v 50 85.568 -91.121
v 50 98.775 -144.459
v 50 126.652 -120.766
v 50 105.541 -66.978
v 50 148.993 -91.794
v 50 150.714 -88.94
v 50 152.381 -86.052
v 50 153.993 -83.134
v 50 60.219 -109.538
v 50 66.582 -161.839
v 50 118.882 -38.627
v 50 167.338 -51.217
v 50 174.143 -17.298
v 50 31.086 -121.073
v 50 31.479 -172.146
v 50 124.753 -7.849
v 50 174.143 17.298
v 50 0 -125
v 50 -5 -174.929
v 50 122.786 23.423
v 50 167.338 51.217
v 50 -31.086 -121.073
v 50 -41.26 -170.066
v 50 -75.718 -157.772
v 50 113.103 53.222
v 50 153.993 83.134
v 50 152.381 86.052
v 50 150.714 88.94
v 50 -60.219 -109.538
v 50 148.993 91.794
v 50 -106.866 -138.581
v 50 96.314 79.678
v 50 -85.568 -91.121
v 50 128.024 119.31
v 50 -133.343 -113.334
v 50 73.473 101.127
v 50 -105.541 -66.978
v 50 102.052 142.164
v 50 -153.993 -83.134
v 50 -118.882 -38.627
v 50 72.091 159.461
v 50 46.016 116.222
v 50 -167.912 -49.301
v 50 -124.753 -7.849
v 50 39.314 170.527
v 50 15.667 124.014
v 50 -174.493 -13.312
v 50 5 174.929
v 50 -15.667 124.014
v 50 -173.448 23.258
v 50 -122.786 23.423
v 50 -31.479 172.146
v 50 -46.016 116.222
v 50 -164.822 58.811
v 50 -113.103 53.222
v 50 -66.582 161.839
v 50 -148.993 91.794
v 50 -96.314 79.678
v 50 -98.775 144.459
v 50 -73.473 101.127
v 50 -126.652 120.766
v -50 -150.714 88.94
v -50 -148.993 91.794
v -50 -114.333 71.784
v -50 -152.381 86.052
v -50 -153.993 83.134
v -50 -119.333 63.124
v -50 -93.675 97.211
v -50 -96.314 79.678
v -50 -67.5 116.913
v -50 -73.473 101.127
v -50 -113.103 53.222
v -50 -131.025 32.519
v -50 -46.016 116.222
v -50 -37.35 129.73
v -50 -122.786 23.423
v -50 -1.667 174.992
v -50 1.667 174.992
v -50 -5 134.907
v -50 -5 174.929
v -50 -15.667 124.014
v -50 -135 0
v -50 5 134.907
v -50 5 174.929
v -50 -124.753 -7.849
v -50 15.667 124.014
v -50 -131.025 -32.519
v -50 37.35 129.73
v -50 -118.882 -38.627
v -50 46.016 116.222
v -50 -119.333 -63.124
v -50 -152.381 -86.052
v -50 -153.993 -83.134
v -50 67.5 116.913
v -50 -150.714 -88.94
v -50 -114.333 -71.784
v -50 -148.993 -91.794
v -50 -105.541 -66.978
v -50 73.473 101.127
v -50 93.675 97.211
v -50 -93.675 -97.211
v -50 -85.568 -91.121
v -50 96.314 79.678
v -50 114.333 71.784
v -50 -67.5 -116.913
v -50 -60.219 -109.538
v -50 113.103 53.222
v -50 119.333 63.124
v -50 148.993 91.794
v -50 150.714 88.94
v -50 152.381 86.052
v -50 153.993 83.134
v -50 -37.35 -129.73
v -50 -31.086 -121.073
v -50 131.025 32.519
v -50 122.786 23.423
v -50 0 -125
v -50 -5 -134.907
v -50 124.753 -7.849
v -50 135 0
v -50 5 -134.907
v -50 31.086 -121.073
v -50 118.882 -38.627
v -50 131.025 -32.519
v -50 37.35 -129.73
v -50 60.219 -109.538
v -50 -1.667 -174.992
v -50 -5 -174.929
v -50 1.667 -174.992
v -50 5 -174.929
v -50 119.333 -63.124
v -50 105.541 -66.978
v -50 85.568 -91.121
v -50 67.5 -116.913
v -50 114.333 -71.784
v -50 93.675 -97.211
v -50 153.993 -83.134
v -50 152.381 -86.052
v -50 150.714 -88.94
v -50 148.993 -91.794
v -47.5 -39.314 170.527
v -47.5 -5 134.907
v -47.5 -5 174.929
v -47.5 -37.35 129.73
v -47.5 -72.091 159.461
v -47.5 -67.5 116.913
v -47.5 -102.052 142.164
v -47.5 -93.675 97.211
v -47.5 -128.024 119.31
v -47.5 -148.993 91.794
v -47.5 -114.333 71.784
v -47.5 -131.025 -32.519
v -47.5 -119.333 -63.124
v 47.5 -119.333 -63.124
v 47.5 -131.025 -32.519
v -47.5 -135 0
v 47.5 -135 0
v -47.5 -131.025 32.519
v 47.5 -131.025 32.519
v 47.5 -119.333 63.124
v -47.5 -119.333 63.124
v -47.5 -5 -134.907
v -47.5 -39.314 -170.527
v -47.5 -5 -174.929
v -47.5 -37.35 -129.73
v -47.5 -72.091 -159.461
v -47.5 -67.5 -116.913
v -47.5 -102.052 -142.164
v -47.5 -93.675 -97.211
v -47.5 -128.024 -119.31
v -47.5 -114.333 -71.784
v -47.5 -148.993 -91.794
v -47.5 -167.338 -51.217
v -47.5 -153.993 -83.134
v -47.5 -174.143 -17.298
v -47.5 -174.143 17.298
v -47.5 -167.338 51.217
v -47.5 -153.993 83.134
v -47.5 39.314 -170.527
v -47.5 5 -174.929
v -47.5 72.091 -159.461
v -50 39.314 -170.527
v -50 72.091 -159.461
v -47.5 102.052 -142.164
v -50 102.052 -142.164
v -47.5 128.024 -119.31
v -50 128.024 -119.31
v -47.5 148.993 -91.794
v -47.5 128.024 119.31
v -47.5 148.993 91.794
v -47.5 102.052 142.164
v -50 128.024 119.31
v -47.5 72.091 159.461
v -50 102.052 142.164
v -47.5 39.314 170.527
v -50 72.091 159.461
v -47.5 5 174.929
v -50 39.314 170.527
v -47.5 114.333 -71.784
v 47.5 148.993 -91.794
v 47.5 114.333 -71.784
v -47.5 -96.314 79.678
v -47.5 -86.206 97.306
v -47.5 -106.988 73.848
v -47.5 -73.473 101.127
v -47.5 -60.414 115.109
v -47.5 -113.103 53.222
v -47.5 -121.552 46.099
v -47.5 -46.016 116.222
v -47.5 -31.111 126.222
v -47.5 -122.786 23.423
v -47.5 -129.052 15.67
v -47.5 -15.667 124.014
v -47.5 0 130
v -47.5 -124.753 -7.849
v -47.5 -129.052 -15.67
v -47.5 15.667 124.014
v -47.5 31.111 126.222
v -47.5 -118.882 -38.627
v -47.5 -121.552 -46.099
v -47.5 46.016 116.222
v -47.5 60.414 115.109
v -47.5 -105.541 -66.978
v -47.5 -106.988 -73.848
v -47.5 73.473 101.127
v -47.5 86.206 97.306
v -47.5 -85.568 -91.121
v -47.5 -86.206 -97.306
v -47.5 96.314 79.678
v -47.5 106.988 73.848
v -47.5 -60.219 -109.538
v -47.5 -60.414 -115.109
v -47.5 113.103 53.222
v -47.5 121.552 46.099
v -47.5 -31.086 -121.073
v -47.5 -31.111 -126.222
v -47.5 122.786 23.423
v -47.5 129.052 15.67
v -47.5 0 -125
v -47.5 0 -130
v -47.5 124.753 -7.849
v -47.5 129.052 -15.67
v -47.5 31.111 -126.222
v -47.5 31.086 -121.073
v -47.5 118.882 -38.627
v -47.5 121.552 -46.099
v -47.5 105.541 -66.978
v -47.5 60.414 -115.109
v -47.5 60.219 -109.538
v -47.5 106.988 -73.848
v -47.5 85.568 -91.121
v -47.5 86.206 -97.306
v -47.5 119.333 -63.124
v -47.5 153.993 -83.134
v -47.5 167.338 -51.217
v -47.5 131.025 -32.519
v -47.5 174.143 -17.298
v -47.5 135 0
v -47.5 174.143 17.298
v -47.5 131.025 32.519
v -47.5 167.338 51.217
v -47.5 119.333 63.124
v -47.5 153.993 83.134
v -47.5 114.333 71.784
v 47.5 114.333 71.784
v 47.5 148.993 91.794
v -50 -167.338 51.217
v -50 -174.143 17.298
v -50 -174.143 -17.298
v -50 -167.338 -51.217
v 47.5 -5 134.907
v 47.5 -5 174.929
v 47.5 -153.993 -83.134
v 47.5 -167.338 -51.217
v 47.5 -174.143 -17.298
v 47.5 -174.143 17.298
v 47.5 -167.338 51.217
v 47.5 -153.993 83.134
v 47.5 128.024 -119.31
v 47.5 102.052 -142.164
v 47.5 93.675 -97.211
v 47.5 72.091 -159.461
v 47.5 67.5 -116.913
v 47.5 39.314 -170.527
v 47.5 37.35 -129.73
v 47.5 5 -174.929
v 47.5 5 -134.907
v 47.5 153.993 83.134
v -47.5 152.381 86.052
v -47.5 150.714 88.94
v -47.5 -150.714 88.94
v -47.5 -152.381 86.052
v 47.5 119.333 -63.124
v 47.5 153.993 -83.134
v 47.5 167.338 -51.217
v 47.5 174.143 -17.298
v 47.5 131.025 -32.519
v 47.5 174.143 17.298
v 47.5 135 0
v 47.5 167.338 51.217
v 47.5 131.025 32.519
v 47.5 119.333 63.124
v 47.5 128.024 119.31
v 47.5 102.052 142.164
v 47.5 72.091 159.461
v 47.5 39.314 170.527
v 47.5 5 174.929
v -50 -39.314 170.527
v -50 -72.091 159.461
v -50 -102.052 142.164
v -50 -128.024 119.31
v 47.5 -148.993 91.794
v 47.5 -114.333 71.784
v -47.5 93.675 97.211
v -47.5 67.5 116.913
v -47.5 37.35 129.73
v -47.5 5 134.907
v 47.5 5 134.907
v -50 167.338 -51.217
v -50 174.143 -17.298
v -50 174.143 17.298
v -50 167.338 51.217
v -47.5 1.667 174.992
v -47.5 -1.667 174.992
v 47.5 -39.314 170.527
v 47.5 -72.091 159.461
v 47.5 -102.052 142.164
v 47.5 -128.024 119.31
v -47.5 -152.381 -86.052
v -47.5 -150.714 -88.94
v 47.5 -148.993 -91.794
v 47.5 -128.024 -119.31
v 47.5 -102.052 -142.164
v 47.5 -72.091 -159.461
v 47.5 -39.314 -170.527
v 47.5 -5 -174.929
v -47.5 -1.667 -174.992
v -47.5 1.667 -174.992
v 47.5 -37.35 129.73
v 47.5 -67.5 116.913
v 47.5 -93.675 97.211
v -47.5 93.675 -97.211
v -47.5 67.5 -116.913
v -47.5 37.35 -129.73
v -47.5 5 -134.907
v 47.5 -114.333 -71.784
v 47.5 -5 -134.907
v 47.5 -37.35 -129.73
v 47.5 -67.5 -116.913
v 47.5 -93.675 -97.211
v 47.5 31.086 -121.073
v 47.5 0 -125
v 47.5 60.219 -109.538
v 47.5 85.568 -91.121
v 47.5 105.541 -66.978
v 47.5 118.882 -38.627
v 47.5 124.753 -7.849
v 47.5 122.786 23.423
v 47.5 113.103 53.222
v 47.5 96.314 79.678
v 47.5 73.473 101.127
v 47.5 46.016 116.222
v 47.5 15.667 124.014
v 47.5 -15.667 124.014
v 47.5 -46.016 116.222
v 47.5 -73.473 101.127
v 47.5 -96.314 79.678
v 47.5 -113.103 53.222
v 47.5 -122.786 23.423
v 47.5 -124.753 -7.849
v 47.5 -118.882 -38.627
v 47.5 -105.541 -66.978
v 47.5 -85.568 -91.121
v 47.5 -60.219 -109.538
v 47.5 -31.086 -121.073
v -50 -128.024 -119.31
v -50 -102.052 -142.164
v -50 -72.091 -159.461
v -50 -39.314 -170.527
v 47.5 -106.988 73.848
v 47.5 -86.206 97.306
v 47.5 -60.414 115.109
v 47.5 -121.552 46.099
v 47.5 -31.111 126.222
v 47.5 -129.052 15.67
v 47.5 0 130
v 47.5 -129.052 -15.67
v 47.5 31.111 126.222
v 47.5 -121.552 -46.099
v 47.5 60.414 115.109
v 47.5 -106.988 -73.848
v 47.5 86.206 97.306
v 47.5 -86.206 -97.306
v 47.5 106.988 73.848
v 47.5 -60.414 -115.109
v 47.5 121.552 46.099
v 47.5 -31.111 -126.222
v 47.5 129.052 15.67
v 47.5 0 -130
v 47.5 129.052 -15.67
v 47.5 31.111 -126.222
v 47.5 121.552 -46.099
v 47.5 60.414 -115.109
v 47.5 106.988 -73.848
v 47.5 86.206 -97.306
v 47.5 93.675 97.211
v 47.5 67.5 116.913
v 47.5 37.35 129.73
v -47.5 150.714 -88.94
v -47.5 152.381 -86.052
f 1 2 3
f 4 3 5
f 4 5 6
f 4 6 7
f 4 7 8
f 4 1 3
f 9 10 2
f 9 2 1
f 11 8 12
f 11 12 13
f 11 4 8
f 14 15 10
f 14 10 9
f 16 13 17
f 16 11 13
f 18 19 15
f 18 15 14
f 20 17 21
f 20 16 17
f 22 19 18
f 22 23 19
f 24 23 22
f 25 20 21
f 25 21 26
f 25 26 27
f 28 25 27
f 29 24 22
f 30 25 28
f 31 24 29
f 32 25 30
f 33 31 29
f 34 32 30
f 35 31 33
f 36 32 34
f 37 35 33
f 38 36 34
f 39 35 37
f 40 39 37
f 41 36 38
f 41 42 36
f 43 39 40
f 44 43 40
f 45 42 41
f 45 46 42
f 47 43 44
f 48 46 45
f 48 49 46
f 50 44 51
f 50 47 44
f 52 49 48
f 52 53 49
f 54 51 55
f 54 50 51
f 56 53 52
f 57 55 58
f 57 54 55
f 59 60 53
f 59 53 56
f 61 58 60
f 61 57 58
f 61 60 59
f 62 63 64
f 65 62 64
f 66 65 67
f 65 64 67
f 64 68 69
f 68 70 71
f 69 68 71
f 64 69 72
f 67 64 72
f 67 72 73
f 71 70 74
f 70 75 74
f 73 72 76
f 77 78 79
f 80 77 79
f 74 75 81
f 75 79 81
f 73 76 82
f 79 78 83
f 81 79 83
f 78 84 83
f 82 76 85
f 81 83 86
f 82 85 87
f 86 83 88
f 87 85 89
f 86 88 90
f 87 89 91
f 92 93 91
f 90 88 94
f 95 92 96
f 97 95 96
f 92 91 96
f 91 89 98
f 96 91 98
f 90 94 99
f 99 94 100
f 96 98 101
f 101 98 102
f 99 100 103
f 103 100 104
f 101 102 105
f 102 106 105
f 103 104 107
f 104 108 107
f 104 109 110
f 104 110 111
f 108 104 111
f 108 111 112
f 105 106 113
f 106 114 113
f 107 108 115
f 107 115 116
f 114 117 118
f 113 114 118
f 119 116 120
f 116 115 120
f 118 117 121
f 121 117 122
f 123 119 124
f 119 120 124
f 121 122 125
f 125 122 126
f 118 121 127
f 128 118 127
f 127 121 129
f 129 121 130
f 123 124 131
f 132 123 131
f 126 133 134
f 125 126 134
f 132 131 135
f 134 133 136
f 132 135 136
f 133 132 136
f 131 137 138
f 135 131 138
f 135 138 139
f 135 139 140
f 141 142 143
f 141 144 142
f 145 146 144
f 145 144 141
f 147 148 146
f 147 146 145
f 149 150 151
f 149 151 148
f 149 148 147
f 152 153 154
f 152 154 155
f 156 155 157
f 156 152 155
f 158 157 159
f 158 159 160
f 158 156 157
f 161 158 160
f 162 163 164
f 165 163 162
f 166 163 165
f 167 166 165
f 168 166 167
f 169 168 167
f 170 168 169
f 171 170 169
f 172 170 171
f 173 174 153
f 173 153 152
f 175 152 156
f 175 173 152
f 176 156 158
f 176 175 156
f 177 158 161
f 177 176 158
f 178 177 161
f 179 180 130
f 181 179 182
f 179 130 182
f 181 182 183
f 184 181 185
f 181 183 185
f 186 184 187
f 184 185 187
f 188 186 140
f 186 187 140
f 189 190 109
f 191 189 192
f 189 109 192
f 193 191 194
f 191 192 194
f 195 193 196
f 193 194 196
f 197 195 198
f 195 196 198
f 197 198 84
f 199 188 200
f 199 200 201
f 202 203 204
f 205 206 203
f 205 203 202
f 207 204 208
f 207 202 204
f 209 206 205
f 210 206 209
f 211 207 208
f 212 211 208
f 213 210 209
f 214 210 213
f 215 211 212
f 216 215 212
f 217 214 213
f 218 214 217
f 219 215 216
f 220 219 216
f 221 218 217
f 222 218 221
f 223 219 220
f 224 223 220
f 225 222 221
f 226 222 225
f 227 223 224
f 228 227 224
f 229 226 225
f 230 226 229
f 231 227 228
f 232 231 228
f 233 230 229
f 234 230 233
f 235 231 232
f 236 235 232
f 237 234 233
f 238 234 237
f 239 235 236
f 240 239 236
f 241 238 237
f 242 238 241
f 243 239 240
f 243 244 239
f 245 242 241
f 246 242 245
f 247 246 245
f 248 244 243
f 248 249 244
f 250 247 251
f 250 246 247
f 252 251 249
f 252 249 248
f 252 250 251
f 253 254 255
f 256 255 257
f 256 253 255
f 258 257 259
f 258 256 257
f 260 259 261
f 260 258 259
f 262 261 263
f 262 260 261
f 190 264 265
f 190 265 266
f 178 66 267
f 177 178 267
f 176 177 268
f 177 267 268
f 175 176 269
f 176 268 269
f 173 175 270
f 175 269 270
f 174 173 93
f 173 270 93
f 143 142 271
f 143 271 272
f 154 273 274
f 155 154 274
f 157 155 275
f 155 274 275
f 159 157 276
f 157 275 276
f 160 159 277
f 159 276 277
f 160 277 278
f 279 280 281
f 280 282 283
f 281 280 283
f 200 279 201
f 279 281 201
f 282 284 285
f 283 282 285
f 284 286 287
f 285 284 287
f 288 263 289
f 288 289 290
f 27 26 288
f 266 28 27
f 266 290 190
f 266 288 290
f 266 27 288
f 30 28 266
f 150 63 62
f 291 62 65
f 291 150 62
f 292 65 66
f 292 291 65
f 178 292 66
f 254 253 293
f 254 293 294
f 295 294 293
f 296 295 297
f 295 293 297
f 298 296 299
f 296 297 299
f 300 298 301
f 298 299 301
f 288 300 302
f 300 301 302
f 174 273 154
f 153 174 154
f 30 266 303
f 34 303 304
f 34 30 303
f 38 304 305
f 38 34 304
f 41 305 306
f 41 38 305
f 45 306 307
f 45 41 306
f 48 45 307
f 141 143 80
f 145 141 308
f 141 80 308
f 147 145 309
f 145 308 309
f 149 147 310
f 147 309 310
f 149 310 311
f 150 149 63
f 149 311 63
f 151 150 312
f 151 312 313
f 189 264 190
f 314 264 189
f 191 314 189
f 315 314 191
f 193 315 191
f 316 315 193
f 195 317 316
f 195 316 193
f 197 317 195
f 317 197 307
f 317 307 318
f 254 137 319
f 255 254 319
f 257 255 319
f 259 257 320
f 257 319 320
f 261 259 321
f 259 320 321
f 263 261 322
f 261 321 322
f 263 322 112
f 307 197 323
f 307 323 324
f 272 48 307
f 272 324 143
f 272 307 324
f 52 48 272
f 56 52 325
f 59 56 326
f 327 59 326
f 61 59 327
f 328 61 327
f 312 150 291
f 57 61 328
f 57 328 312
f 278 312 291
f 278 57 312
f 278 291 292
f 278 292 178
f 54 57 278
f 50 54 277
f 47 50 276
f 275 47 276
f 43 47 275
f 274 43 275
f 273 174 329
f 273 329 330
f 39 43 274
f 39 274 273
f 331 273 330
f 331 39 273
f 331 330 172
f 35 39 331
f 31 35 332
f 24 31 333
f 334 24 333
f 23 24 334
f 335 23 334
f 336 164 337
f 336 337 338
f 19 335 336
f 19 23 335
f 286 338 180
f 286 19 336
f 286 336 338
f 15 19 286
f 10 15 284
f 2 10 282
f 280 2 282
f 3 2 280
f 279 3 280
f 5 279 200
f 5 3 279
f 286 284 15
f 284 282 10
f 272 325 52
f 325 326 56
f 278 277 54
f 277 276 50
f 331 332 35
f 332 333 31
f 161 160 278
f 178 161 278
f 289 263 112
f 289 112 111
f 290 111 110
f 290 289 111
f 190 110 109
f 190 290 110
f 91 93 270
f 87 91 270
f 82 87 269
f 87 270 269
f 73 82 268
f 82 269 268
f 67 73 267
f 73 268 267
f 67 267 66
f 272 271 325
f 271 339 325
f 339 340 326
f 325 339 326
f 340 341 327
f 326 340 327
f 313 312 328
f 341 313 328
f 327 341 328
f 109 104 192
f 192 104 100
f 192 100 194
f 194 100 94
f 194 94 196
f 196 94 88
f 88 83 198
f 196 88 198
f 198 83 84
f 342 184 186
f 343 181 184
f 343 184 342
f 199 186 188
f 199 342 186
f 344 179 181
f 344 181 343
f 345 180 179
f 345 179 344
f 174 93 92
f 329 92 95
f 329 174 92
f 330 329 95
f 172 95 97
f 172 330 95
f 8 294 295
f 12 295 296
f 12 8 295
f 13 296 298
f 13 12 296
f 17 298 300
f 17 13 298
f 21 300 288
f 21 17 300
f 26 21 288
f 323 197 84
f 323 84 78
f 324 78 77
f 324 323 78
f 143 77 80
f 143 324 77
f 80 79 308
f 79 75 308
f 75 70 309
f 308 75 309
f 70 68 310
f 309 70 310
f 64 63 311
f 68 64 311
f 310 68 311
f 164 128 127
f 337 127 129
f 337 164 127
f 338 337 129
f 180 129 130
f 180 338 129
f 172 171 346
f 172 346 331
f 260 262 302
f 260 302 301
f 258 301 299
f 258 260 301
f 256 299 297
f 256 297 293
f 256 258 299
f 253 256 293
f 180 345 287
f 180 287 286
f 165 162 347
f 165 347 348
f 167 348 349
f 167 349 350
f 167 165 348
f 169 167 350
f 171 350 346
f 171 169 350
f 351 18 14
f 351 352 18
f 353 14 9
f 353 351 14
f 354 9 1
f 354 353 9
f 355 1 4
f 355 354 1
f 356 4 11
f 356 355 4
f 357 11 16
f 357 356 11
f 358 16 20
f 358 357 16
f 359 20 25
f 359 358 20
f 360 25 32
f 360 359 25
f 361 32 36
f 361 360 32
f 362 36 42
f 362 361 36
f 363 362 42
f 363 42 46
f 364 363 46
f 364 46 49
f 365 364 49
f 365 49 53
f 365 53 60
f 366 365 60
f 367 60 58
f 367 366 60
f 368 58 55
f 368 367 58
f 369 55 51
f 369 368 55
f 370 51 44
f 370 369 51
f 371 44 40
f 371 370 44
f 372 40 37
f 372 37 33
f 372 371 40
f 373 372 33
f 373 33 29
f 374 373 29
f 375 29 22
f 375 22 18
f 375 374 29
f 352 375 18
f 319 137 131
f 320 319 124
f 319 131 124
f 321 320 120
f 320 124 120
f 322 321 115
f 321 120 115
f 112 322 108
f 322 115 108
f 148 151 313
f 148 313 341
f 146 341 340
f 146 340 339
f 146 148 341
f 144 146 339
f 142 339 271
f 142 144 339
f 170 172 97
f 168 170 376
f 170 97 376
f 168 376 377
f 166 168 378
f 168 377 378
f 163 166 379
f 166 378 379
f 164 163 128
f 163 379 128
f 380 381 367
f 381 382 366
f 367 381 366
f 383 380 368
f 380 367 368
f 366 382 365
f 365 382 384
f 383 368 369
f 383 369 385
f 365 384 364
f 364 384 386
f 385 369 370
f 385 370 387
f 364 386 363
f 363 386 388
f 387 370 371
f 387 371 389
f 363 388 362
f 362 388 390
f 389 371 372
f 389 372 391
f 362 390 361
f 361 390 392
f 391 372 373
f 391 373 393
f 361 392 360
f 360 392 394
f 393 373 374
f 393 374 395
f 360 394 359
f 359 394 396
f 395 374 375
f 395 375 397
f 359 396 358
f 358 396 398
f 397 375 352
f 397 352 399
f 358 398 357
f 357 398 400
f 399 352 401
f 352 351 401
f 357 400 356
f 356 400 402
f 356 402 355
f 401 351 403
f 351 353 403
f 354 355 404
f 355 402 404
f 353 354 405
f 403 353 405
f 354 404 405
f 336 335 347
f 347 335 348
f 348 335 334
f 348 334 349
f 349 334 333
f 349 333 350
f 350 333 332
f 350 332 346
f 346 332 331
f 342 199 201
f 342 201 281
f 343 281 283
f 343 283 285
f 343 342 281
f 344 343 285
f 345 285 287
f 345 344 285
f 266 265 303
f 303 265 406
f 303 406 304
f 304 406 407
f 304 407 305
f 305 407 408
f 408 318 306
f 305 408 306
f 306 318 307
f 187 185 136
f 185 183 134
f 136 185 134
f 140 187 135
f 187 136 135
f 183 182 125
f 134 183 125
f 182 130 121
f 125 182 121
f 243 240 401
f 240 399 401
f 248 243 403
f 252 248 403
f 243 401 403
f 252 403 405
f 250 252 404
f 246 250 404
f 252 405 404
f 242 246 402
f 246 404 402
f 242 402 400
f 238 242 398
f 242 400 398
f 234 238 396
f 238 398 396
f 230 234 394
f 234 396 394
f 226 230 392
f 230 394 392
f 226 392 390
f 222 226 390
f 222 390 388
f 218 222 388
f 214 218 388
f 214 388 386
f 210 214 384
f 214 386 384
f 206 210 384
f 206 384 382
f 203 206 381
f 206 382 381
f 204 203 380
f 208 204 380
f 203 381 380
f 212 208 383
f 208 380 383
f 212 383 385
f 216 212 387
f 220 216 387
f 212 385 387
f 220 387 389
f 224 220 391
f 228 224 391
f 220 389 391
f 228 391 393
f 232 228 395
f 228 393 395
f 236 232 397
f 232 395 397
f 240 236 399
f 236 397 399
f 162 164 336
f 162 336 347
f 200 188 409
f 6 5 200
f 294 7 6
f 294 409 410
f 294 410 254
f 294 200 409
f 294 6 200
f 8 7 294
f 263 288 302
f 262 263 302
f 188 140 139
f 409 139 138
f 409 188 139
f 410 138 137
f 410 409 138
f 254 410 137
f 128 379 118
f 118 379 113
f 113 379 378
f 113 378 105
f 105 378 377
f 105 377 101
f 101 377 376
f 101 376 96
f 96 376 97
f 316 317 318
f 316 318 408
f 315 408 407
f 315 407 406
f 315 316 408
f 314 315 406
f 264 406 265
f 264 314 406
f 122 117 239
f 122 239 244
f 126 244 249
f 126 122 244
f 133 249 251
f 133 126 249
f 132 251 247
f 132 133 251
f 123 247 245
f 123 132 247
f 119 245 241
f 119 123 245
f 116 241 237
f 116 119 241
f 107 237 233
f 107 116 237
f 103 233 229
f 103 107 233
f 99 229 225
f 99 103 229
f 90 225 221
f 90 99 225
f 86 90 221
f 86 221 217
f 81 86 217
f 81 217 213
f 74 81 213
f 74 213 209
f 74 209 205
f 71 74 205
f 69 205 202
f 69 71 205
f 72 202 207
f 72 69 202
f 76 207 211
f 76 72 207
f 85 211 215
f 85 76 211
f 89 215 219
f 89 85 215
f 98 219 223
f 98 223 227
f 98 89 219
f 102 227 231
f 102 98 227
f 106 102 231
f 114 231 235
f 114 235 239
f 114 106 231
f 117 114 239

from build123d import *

# Parameters (mm, degrees)
SKETCH8_R               = 175
SKETCH8_R_2             = 125
BOSS_EXTRUDE7_DEPTH     = 50
SKETCH9_R               = 130
SKETCH9_R_2             = 125
CUT_EXTRUDE2_DEPTH      = 47.5
CUT_EXTRUDE3_DEPTH      = 267.926956301
CUT_EXTRUDE3_DEPTH_BACK = 267.926956301
SKETCH11_R              = 175
SKETCH11_R_2            = 125
BOSS_EXTRUDE8_DEPTH     = 2.5


with BuildPart() as part:
    # Sketch8 → Boss-Extrude7 (new, symmetric)
    with BuildSketch(Plane.YZ):
        Circle(SKETCH8_R)
        Circle(SKETCH8_R_2, mode=Mode.SUBTRACT)
    extrude(amount=BOSS_EXTRUDE7_DEPTH, both=True)

    # Sketch9 → Cut-Extrude2 (cut, symmetric)
    with BuildSketch(Plane.YZ):
        Circle(SKETCH9_R)
        Circle(SKETCH9_R_2, mode=Mode.SUBTRACT)
    extrude(amount=CUT_EXTRUDE2_DEPTH, both=True, mode=Mode.SUBTRACT)

    # Sketch10 → Cut-Extrude3 (cut, two sides: drawn at the far end of the back side and taken through both)
    with BuildSketch(Plane.YZ.offset(50).offset(-CUT_EXTRUDE3_DEPTH_BACK)):
        with BuildLine():
            Line((114.333214455, 71.783814835), (148.992574075, 91.794405442))
            ThreePointArc((148.992574075, 91.794405442), (87.5, 151.554445662), (5, 174.928556845))
            Line((5, 174.928556845), (5, 134.907375632))
            ThreePointArc((5, 134.907375632), (67.5, 116.913429511), (114.333214455, 71.783814835))
        make_face()
        with BuildLine():
            ThreePointArc((153.992574075, -83.134151404), (175, 0), (153.992574075, 83.134151404))
            Line((153.992574075, 83.134151404), (119.333214455, 63.123560797))
            ThreePointArc((119.333214455, 63.123560797), (135, 0), (119.333214455, -63.123560797))
            Line((119.333214455, -63.123560797), (153.992574075, -83.134151404))
        make_face()
        with BuildLine():
            ThreePointArc((-114.333214455, 71.783814835), (-67.5, 116.913429511), (-5, 134.907375632))
            Line((-5, 134.907375632), (-5, 174.928556845))
            ThreePointArc((-5, 174.928556845), (-87.5, 151.554445662), (-148.992574075, 91.794405442))
            Line((-148.992574075, 91.794405442), (-114.333214455, 71.783814835))
        make_face()
        with BuildLine():
            Line((148.992574075, -91.794405442), (114.333214455, -71.783814835))
            ThreePointArc((114.333214455, -71.783814835), (67.5, -116.913429511), (5, -134.907375632))
            Line((5, -134.907375632), (5, -174.928556845))
            ThreePointArc((5, -174.928556845), (87.5, -151.554445662), (148.992574075, -91.794405442))
        make_face()
        with BuildLine():
            ThreePointArc((-119.333214455, -63.123560797), (-135, 0), (-119.333214455, 63.123560797))
            Line((-119.333214455, 63.123560797), (-153.992574075, 83.134151404))
            ThreePointArc((-153.992574075, 83.134151404), (-175, 0), (-153.992574075, -83.134151404))
            Line((-153.992574075, -83.134151404), (-119.333214455, -63.123560797))
        make_face()
        with BuildLine():
            Line((-5, -174.928556845), (-5, -134.907375632))
            ThreePointArc((-5, -134.907375632), (-67.5, -116.913429511), (-114.333214455, -71.783814835))
            Line((-114.333214455, -71.783814835), (-148.992574075, -91.794405442))
            ThreePointArc((-148.992574075, -91.794405442), (-87.5, -151.554445662), (-5, -174.928556845))
        make_face()
    extrude(amount=CUT_EXTRUDE3_DEPTH + CUT_EXTRUDE3_DEPTH_BACK, mode=Mode.SUBTRACT)

    # Sketch11 → Boss-Extrude8 (add)
    with BuildSketch(Plane.YZ.offset(50)):
        Circle(SKETCH11_R)
        Circle(SKETCH11_R_2, mode=Mode.SUBTRACT)
    boss_extrude8 = extrude(amount=-BOSS_EXTRUDE8_DEPTH)

    # Mirror3: Boss-Extrude8 across plane
    add(boss_extrude8.mirror(Plane(origin=(0, 0, 0), x_dir=(0, 0, 1), z_dir=(1, 0, 0))))


solid = part.part
